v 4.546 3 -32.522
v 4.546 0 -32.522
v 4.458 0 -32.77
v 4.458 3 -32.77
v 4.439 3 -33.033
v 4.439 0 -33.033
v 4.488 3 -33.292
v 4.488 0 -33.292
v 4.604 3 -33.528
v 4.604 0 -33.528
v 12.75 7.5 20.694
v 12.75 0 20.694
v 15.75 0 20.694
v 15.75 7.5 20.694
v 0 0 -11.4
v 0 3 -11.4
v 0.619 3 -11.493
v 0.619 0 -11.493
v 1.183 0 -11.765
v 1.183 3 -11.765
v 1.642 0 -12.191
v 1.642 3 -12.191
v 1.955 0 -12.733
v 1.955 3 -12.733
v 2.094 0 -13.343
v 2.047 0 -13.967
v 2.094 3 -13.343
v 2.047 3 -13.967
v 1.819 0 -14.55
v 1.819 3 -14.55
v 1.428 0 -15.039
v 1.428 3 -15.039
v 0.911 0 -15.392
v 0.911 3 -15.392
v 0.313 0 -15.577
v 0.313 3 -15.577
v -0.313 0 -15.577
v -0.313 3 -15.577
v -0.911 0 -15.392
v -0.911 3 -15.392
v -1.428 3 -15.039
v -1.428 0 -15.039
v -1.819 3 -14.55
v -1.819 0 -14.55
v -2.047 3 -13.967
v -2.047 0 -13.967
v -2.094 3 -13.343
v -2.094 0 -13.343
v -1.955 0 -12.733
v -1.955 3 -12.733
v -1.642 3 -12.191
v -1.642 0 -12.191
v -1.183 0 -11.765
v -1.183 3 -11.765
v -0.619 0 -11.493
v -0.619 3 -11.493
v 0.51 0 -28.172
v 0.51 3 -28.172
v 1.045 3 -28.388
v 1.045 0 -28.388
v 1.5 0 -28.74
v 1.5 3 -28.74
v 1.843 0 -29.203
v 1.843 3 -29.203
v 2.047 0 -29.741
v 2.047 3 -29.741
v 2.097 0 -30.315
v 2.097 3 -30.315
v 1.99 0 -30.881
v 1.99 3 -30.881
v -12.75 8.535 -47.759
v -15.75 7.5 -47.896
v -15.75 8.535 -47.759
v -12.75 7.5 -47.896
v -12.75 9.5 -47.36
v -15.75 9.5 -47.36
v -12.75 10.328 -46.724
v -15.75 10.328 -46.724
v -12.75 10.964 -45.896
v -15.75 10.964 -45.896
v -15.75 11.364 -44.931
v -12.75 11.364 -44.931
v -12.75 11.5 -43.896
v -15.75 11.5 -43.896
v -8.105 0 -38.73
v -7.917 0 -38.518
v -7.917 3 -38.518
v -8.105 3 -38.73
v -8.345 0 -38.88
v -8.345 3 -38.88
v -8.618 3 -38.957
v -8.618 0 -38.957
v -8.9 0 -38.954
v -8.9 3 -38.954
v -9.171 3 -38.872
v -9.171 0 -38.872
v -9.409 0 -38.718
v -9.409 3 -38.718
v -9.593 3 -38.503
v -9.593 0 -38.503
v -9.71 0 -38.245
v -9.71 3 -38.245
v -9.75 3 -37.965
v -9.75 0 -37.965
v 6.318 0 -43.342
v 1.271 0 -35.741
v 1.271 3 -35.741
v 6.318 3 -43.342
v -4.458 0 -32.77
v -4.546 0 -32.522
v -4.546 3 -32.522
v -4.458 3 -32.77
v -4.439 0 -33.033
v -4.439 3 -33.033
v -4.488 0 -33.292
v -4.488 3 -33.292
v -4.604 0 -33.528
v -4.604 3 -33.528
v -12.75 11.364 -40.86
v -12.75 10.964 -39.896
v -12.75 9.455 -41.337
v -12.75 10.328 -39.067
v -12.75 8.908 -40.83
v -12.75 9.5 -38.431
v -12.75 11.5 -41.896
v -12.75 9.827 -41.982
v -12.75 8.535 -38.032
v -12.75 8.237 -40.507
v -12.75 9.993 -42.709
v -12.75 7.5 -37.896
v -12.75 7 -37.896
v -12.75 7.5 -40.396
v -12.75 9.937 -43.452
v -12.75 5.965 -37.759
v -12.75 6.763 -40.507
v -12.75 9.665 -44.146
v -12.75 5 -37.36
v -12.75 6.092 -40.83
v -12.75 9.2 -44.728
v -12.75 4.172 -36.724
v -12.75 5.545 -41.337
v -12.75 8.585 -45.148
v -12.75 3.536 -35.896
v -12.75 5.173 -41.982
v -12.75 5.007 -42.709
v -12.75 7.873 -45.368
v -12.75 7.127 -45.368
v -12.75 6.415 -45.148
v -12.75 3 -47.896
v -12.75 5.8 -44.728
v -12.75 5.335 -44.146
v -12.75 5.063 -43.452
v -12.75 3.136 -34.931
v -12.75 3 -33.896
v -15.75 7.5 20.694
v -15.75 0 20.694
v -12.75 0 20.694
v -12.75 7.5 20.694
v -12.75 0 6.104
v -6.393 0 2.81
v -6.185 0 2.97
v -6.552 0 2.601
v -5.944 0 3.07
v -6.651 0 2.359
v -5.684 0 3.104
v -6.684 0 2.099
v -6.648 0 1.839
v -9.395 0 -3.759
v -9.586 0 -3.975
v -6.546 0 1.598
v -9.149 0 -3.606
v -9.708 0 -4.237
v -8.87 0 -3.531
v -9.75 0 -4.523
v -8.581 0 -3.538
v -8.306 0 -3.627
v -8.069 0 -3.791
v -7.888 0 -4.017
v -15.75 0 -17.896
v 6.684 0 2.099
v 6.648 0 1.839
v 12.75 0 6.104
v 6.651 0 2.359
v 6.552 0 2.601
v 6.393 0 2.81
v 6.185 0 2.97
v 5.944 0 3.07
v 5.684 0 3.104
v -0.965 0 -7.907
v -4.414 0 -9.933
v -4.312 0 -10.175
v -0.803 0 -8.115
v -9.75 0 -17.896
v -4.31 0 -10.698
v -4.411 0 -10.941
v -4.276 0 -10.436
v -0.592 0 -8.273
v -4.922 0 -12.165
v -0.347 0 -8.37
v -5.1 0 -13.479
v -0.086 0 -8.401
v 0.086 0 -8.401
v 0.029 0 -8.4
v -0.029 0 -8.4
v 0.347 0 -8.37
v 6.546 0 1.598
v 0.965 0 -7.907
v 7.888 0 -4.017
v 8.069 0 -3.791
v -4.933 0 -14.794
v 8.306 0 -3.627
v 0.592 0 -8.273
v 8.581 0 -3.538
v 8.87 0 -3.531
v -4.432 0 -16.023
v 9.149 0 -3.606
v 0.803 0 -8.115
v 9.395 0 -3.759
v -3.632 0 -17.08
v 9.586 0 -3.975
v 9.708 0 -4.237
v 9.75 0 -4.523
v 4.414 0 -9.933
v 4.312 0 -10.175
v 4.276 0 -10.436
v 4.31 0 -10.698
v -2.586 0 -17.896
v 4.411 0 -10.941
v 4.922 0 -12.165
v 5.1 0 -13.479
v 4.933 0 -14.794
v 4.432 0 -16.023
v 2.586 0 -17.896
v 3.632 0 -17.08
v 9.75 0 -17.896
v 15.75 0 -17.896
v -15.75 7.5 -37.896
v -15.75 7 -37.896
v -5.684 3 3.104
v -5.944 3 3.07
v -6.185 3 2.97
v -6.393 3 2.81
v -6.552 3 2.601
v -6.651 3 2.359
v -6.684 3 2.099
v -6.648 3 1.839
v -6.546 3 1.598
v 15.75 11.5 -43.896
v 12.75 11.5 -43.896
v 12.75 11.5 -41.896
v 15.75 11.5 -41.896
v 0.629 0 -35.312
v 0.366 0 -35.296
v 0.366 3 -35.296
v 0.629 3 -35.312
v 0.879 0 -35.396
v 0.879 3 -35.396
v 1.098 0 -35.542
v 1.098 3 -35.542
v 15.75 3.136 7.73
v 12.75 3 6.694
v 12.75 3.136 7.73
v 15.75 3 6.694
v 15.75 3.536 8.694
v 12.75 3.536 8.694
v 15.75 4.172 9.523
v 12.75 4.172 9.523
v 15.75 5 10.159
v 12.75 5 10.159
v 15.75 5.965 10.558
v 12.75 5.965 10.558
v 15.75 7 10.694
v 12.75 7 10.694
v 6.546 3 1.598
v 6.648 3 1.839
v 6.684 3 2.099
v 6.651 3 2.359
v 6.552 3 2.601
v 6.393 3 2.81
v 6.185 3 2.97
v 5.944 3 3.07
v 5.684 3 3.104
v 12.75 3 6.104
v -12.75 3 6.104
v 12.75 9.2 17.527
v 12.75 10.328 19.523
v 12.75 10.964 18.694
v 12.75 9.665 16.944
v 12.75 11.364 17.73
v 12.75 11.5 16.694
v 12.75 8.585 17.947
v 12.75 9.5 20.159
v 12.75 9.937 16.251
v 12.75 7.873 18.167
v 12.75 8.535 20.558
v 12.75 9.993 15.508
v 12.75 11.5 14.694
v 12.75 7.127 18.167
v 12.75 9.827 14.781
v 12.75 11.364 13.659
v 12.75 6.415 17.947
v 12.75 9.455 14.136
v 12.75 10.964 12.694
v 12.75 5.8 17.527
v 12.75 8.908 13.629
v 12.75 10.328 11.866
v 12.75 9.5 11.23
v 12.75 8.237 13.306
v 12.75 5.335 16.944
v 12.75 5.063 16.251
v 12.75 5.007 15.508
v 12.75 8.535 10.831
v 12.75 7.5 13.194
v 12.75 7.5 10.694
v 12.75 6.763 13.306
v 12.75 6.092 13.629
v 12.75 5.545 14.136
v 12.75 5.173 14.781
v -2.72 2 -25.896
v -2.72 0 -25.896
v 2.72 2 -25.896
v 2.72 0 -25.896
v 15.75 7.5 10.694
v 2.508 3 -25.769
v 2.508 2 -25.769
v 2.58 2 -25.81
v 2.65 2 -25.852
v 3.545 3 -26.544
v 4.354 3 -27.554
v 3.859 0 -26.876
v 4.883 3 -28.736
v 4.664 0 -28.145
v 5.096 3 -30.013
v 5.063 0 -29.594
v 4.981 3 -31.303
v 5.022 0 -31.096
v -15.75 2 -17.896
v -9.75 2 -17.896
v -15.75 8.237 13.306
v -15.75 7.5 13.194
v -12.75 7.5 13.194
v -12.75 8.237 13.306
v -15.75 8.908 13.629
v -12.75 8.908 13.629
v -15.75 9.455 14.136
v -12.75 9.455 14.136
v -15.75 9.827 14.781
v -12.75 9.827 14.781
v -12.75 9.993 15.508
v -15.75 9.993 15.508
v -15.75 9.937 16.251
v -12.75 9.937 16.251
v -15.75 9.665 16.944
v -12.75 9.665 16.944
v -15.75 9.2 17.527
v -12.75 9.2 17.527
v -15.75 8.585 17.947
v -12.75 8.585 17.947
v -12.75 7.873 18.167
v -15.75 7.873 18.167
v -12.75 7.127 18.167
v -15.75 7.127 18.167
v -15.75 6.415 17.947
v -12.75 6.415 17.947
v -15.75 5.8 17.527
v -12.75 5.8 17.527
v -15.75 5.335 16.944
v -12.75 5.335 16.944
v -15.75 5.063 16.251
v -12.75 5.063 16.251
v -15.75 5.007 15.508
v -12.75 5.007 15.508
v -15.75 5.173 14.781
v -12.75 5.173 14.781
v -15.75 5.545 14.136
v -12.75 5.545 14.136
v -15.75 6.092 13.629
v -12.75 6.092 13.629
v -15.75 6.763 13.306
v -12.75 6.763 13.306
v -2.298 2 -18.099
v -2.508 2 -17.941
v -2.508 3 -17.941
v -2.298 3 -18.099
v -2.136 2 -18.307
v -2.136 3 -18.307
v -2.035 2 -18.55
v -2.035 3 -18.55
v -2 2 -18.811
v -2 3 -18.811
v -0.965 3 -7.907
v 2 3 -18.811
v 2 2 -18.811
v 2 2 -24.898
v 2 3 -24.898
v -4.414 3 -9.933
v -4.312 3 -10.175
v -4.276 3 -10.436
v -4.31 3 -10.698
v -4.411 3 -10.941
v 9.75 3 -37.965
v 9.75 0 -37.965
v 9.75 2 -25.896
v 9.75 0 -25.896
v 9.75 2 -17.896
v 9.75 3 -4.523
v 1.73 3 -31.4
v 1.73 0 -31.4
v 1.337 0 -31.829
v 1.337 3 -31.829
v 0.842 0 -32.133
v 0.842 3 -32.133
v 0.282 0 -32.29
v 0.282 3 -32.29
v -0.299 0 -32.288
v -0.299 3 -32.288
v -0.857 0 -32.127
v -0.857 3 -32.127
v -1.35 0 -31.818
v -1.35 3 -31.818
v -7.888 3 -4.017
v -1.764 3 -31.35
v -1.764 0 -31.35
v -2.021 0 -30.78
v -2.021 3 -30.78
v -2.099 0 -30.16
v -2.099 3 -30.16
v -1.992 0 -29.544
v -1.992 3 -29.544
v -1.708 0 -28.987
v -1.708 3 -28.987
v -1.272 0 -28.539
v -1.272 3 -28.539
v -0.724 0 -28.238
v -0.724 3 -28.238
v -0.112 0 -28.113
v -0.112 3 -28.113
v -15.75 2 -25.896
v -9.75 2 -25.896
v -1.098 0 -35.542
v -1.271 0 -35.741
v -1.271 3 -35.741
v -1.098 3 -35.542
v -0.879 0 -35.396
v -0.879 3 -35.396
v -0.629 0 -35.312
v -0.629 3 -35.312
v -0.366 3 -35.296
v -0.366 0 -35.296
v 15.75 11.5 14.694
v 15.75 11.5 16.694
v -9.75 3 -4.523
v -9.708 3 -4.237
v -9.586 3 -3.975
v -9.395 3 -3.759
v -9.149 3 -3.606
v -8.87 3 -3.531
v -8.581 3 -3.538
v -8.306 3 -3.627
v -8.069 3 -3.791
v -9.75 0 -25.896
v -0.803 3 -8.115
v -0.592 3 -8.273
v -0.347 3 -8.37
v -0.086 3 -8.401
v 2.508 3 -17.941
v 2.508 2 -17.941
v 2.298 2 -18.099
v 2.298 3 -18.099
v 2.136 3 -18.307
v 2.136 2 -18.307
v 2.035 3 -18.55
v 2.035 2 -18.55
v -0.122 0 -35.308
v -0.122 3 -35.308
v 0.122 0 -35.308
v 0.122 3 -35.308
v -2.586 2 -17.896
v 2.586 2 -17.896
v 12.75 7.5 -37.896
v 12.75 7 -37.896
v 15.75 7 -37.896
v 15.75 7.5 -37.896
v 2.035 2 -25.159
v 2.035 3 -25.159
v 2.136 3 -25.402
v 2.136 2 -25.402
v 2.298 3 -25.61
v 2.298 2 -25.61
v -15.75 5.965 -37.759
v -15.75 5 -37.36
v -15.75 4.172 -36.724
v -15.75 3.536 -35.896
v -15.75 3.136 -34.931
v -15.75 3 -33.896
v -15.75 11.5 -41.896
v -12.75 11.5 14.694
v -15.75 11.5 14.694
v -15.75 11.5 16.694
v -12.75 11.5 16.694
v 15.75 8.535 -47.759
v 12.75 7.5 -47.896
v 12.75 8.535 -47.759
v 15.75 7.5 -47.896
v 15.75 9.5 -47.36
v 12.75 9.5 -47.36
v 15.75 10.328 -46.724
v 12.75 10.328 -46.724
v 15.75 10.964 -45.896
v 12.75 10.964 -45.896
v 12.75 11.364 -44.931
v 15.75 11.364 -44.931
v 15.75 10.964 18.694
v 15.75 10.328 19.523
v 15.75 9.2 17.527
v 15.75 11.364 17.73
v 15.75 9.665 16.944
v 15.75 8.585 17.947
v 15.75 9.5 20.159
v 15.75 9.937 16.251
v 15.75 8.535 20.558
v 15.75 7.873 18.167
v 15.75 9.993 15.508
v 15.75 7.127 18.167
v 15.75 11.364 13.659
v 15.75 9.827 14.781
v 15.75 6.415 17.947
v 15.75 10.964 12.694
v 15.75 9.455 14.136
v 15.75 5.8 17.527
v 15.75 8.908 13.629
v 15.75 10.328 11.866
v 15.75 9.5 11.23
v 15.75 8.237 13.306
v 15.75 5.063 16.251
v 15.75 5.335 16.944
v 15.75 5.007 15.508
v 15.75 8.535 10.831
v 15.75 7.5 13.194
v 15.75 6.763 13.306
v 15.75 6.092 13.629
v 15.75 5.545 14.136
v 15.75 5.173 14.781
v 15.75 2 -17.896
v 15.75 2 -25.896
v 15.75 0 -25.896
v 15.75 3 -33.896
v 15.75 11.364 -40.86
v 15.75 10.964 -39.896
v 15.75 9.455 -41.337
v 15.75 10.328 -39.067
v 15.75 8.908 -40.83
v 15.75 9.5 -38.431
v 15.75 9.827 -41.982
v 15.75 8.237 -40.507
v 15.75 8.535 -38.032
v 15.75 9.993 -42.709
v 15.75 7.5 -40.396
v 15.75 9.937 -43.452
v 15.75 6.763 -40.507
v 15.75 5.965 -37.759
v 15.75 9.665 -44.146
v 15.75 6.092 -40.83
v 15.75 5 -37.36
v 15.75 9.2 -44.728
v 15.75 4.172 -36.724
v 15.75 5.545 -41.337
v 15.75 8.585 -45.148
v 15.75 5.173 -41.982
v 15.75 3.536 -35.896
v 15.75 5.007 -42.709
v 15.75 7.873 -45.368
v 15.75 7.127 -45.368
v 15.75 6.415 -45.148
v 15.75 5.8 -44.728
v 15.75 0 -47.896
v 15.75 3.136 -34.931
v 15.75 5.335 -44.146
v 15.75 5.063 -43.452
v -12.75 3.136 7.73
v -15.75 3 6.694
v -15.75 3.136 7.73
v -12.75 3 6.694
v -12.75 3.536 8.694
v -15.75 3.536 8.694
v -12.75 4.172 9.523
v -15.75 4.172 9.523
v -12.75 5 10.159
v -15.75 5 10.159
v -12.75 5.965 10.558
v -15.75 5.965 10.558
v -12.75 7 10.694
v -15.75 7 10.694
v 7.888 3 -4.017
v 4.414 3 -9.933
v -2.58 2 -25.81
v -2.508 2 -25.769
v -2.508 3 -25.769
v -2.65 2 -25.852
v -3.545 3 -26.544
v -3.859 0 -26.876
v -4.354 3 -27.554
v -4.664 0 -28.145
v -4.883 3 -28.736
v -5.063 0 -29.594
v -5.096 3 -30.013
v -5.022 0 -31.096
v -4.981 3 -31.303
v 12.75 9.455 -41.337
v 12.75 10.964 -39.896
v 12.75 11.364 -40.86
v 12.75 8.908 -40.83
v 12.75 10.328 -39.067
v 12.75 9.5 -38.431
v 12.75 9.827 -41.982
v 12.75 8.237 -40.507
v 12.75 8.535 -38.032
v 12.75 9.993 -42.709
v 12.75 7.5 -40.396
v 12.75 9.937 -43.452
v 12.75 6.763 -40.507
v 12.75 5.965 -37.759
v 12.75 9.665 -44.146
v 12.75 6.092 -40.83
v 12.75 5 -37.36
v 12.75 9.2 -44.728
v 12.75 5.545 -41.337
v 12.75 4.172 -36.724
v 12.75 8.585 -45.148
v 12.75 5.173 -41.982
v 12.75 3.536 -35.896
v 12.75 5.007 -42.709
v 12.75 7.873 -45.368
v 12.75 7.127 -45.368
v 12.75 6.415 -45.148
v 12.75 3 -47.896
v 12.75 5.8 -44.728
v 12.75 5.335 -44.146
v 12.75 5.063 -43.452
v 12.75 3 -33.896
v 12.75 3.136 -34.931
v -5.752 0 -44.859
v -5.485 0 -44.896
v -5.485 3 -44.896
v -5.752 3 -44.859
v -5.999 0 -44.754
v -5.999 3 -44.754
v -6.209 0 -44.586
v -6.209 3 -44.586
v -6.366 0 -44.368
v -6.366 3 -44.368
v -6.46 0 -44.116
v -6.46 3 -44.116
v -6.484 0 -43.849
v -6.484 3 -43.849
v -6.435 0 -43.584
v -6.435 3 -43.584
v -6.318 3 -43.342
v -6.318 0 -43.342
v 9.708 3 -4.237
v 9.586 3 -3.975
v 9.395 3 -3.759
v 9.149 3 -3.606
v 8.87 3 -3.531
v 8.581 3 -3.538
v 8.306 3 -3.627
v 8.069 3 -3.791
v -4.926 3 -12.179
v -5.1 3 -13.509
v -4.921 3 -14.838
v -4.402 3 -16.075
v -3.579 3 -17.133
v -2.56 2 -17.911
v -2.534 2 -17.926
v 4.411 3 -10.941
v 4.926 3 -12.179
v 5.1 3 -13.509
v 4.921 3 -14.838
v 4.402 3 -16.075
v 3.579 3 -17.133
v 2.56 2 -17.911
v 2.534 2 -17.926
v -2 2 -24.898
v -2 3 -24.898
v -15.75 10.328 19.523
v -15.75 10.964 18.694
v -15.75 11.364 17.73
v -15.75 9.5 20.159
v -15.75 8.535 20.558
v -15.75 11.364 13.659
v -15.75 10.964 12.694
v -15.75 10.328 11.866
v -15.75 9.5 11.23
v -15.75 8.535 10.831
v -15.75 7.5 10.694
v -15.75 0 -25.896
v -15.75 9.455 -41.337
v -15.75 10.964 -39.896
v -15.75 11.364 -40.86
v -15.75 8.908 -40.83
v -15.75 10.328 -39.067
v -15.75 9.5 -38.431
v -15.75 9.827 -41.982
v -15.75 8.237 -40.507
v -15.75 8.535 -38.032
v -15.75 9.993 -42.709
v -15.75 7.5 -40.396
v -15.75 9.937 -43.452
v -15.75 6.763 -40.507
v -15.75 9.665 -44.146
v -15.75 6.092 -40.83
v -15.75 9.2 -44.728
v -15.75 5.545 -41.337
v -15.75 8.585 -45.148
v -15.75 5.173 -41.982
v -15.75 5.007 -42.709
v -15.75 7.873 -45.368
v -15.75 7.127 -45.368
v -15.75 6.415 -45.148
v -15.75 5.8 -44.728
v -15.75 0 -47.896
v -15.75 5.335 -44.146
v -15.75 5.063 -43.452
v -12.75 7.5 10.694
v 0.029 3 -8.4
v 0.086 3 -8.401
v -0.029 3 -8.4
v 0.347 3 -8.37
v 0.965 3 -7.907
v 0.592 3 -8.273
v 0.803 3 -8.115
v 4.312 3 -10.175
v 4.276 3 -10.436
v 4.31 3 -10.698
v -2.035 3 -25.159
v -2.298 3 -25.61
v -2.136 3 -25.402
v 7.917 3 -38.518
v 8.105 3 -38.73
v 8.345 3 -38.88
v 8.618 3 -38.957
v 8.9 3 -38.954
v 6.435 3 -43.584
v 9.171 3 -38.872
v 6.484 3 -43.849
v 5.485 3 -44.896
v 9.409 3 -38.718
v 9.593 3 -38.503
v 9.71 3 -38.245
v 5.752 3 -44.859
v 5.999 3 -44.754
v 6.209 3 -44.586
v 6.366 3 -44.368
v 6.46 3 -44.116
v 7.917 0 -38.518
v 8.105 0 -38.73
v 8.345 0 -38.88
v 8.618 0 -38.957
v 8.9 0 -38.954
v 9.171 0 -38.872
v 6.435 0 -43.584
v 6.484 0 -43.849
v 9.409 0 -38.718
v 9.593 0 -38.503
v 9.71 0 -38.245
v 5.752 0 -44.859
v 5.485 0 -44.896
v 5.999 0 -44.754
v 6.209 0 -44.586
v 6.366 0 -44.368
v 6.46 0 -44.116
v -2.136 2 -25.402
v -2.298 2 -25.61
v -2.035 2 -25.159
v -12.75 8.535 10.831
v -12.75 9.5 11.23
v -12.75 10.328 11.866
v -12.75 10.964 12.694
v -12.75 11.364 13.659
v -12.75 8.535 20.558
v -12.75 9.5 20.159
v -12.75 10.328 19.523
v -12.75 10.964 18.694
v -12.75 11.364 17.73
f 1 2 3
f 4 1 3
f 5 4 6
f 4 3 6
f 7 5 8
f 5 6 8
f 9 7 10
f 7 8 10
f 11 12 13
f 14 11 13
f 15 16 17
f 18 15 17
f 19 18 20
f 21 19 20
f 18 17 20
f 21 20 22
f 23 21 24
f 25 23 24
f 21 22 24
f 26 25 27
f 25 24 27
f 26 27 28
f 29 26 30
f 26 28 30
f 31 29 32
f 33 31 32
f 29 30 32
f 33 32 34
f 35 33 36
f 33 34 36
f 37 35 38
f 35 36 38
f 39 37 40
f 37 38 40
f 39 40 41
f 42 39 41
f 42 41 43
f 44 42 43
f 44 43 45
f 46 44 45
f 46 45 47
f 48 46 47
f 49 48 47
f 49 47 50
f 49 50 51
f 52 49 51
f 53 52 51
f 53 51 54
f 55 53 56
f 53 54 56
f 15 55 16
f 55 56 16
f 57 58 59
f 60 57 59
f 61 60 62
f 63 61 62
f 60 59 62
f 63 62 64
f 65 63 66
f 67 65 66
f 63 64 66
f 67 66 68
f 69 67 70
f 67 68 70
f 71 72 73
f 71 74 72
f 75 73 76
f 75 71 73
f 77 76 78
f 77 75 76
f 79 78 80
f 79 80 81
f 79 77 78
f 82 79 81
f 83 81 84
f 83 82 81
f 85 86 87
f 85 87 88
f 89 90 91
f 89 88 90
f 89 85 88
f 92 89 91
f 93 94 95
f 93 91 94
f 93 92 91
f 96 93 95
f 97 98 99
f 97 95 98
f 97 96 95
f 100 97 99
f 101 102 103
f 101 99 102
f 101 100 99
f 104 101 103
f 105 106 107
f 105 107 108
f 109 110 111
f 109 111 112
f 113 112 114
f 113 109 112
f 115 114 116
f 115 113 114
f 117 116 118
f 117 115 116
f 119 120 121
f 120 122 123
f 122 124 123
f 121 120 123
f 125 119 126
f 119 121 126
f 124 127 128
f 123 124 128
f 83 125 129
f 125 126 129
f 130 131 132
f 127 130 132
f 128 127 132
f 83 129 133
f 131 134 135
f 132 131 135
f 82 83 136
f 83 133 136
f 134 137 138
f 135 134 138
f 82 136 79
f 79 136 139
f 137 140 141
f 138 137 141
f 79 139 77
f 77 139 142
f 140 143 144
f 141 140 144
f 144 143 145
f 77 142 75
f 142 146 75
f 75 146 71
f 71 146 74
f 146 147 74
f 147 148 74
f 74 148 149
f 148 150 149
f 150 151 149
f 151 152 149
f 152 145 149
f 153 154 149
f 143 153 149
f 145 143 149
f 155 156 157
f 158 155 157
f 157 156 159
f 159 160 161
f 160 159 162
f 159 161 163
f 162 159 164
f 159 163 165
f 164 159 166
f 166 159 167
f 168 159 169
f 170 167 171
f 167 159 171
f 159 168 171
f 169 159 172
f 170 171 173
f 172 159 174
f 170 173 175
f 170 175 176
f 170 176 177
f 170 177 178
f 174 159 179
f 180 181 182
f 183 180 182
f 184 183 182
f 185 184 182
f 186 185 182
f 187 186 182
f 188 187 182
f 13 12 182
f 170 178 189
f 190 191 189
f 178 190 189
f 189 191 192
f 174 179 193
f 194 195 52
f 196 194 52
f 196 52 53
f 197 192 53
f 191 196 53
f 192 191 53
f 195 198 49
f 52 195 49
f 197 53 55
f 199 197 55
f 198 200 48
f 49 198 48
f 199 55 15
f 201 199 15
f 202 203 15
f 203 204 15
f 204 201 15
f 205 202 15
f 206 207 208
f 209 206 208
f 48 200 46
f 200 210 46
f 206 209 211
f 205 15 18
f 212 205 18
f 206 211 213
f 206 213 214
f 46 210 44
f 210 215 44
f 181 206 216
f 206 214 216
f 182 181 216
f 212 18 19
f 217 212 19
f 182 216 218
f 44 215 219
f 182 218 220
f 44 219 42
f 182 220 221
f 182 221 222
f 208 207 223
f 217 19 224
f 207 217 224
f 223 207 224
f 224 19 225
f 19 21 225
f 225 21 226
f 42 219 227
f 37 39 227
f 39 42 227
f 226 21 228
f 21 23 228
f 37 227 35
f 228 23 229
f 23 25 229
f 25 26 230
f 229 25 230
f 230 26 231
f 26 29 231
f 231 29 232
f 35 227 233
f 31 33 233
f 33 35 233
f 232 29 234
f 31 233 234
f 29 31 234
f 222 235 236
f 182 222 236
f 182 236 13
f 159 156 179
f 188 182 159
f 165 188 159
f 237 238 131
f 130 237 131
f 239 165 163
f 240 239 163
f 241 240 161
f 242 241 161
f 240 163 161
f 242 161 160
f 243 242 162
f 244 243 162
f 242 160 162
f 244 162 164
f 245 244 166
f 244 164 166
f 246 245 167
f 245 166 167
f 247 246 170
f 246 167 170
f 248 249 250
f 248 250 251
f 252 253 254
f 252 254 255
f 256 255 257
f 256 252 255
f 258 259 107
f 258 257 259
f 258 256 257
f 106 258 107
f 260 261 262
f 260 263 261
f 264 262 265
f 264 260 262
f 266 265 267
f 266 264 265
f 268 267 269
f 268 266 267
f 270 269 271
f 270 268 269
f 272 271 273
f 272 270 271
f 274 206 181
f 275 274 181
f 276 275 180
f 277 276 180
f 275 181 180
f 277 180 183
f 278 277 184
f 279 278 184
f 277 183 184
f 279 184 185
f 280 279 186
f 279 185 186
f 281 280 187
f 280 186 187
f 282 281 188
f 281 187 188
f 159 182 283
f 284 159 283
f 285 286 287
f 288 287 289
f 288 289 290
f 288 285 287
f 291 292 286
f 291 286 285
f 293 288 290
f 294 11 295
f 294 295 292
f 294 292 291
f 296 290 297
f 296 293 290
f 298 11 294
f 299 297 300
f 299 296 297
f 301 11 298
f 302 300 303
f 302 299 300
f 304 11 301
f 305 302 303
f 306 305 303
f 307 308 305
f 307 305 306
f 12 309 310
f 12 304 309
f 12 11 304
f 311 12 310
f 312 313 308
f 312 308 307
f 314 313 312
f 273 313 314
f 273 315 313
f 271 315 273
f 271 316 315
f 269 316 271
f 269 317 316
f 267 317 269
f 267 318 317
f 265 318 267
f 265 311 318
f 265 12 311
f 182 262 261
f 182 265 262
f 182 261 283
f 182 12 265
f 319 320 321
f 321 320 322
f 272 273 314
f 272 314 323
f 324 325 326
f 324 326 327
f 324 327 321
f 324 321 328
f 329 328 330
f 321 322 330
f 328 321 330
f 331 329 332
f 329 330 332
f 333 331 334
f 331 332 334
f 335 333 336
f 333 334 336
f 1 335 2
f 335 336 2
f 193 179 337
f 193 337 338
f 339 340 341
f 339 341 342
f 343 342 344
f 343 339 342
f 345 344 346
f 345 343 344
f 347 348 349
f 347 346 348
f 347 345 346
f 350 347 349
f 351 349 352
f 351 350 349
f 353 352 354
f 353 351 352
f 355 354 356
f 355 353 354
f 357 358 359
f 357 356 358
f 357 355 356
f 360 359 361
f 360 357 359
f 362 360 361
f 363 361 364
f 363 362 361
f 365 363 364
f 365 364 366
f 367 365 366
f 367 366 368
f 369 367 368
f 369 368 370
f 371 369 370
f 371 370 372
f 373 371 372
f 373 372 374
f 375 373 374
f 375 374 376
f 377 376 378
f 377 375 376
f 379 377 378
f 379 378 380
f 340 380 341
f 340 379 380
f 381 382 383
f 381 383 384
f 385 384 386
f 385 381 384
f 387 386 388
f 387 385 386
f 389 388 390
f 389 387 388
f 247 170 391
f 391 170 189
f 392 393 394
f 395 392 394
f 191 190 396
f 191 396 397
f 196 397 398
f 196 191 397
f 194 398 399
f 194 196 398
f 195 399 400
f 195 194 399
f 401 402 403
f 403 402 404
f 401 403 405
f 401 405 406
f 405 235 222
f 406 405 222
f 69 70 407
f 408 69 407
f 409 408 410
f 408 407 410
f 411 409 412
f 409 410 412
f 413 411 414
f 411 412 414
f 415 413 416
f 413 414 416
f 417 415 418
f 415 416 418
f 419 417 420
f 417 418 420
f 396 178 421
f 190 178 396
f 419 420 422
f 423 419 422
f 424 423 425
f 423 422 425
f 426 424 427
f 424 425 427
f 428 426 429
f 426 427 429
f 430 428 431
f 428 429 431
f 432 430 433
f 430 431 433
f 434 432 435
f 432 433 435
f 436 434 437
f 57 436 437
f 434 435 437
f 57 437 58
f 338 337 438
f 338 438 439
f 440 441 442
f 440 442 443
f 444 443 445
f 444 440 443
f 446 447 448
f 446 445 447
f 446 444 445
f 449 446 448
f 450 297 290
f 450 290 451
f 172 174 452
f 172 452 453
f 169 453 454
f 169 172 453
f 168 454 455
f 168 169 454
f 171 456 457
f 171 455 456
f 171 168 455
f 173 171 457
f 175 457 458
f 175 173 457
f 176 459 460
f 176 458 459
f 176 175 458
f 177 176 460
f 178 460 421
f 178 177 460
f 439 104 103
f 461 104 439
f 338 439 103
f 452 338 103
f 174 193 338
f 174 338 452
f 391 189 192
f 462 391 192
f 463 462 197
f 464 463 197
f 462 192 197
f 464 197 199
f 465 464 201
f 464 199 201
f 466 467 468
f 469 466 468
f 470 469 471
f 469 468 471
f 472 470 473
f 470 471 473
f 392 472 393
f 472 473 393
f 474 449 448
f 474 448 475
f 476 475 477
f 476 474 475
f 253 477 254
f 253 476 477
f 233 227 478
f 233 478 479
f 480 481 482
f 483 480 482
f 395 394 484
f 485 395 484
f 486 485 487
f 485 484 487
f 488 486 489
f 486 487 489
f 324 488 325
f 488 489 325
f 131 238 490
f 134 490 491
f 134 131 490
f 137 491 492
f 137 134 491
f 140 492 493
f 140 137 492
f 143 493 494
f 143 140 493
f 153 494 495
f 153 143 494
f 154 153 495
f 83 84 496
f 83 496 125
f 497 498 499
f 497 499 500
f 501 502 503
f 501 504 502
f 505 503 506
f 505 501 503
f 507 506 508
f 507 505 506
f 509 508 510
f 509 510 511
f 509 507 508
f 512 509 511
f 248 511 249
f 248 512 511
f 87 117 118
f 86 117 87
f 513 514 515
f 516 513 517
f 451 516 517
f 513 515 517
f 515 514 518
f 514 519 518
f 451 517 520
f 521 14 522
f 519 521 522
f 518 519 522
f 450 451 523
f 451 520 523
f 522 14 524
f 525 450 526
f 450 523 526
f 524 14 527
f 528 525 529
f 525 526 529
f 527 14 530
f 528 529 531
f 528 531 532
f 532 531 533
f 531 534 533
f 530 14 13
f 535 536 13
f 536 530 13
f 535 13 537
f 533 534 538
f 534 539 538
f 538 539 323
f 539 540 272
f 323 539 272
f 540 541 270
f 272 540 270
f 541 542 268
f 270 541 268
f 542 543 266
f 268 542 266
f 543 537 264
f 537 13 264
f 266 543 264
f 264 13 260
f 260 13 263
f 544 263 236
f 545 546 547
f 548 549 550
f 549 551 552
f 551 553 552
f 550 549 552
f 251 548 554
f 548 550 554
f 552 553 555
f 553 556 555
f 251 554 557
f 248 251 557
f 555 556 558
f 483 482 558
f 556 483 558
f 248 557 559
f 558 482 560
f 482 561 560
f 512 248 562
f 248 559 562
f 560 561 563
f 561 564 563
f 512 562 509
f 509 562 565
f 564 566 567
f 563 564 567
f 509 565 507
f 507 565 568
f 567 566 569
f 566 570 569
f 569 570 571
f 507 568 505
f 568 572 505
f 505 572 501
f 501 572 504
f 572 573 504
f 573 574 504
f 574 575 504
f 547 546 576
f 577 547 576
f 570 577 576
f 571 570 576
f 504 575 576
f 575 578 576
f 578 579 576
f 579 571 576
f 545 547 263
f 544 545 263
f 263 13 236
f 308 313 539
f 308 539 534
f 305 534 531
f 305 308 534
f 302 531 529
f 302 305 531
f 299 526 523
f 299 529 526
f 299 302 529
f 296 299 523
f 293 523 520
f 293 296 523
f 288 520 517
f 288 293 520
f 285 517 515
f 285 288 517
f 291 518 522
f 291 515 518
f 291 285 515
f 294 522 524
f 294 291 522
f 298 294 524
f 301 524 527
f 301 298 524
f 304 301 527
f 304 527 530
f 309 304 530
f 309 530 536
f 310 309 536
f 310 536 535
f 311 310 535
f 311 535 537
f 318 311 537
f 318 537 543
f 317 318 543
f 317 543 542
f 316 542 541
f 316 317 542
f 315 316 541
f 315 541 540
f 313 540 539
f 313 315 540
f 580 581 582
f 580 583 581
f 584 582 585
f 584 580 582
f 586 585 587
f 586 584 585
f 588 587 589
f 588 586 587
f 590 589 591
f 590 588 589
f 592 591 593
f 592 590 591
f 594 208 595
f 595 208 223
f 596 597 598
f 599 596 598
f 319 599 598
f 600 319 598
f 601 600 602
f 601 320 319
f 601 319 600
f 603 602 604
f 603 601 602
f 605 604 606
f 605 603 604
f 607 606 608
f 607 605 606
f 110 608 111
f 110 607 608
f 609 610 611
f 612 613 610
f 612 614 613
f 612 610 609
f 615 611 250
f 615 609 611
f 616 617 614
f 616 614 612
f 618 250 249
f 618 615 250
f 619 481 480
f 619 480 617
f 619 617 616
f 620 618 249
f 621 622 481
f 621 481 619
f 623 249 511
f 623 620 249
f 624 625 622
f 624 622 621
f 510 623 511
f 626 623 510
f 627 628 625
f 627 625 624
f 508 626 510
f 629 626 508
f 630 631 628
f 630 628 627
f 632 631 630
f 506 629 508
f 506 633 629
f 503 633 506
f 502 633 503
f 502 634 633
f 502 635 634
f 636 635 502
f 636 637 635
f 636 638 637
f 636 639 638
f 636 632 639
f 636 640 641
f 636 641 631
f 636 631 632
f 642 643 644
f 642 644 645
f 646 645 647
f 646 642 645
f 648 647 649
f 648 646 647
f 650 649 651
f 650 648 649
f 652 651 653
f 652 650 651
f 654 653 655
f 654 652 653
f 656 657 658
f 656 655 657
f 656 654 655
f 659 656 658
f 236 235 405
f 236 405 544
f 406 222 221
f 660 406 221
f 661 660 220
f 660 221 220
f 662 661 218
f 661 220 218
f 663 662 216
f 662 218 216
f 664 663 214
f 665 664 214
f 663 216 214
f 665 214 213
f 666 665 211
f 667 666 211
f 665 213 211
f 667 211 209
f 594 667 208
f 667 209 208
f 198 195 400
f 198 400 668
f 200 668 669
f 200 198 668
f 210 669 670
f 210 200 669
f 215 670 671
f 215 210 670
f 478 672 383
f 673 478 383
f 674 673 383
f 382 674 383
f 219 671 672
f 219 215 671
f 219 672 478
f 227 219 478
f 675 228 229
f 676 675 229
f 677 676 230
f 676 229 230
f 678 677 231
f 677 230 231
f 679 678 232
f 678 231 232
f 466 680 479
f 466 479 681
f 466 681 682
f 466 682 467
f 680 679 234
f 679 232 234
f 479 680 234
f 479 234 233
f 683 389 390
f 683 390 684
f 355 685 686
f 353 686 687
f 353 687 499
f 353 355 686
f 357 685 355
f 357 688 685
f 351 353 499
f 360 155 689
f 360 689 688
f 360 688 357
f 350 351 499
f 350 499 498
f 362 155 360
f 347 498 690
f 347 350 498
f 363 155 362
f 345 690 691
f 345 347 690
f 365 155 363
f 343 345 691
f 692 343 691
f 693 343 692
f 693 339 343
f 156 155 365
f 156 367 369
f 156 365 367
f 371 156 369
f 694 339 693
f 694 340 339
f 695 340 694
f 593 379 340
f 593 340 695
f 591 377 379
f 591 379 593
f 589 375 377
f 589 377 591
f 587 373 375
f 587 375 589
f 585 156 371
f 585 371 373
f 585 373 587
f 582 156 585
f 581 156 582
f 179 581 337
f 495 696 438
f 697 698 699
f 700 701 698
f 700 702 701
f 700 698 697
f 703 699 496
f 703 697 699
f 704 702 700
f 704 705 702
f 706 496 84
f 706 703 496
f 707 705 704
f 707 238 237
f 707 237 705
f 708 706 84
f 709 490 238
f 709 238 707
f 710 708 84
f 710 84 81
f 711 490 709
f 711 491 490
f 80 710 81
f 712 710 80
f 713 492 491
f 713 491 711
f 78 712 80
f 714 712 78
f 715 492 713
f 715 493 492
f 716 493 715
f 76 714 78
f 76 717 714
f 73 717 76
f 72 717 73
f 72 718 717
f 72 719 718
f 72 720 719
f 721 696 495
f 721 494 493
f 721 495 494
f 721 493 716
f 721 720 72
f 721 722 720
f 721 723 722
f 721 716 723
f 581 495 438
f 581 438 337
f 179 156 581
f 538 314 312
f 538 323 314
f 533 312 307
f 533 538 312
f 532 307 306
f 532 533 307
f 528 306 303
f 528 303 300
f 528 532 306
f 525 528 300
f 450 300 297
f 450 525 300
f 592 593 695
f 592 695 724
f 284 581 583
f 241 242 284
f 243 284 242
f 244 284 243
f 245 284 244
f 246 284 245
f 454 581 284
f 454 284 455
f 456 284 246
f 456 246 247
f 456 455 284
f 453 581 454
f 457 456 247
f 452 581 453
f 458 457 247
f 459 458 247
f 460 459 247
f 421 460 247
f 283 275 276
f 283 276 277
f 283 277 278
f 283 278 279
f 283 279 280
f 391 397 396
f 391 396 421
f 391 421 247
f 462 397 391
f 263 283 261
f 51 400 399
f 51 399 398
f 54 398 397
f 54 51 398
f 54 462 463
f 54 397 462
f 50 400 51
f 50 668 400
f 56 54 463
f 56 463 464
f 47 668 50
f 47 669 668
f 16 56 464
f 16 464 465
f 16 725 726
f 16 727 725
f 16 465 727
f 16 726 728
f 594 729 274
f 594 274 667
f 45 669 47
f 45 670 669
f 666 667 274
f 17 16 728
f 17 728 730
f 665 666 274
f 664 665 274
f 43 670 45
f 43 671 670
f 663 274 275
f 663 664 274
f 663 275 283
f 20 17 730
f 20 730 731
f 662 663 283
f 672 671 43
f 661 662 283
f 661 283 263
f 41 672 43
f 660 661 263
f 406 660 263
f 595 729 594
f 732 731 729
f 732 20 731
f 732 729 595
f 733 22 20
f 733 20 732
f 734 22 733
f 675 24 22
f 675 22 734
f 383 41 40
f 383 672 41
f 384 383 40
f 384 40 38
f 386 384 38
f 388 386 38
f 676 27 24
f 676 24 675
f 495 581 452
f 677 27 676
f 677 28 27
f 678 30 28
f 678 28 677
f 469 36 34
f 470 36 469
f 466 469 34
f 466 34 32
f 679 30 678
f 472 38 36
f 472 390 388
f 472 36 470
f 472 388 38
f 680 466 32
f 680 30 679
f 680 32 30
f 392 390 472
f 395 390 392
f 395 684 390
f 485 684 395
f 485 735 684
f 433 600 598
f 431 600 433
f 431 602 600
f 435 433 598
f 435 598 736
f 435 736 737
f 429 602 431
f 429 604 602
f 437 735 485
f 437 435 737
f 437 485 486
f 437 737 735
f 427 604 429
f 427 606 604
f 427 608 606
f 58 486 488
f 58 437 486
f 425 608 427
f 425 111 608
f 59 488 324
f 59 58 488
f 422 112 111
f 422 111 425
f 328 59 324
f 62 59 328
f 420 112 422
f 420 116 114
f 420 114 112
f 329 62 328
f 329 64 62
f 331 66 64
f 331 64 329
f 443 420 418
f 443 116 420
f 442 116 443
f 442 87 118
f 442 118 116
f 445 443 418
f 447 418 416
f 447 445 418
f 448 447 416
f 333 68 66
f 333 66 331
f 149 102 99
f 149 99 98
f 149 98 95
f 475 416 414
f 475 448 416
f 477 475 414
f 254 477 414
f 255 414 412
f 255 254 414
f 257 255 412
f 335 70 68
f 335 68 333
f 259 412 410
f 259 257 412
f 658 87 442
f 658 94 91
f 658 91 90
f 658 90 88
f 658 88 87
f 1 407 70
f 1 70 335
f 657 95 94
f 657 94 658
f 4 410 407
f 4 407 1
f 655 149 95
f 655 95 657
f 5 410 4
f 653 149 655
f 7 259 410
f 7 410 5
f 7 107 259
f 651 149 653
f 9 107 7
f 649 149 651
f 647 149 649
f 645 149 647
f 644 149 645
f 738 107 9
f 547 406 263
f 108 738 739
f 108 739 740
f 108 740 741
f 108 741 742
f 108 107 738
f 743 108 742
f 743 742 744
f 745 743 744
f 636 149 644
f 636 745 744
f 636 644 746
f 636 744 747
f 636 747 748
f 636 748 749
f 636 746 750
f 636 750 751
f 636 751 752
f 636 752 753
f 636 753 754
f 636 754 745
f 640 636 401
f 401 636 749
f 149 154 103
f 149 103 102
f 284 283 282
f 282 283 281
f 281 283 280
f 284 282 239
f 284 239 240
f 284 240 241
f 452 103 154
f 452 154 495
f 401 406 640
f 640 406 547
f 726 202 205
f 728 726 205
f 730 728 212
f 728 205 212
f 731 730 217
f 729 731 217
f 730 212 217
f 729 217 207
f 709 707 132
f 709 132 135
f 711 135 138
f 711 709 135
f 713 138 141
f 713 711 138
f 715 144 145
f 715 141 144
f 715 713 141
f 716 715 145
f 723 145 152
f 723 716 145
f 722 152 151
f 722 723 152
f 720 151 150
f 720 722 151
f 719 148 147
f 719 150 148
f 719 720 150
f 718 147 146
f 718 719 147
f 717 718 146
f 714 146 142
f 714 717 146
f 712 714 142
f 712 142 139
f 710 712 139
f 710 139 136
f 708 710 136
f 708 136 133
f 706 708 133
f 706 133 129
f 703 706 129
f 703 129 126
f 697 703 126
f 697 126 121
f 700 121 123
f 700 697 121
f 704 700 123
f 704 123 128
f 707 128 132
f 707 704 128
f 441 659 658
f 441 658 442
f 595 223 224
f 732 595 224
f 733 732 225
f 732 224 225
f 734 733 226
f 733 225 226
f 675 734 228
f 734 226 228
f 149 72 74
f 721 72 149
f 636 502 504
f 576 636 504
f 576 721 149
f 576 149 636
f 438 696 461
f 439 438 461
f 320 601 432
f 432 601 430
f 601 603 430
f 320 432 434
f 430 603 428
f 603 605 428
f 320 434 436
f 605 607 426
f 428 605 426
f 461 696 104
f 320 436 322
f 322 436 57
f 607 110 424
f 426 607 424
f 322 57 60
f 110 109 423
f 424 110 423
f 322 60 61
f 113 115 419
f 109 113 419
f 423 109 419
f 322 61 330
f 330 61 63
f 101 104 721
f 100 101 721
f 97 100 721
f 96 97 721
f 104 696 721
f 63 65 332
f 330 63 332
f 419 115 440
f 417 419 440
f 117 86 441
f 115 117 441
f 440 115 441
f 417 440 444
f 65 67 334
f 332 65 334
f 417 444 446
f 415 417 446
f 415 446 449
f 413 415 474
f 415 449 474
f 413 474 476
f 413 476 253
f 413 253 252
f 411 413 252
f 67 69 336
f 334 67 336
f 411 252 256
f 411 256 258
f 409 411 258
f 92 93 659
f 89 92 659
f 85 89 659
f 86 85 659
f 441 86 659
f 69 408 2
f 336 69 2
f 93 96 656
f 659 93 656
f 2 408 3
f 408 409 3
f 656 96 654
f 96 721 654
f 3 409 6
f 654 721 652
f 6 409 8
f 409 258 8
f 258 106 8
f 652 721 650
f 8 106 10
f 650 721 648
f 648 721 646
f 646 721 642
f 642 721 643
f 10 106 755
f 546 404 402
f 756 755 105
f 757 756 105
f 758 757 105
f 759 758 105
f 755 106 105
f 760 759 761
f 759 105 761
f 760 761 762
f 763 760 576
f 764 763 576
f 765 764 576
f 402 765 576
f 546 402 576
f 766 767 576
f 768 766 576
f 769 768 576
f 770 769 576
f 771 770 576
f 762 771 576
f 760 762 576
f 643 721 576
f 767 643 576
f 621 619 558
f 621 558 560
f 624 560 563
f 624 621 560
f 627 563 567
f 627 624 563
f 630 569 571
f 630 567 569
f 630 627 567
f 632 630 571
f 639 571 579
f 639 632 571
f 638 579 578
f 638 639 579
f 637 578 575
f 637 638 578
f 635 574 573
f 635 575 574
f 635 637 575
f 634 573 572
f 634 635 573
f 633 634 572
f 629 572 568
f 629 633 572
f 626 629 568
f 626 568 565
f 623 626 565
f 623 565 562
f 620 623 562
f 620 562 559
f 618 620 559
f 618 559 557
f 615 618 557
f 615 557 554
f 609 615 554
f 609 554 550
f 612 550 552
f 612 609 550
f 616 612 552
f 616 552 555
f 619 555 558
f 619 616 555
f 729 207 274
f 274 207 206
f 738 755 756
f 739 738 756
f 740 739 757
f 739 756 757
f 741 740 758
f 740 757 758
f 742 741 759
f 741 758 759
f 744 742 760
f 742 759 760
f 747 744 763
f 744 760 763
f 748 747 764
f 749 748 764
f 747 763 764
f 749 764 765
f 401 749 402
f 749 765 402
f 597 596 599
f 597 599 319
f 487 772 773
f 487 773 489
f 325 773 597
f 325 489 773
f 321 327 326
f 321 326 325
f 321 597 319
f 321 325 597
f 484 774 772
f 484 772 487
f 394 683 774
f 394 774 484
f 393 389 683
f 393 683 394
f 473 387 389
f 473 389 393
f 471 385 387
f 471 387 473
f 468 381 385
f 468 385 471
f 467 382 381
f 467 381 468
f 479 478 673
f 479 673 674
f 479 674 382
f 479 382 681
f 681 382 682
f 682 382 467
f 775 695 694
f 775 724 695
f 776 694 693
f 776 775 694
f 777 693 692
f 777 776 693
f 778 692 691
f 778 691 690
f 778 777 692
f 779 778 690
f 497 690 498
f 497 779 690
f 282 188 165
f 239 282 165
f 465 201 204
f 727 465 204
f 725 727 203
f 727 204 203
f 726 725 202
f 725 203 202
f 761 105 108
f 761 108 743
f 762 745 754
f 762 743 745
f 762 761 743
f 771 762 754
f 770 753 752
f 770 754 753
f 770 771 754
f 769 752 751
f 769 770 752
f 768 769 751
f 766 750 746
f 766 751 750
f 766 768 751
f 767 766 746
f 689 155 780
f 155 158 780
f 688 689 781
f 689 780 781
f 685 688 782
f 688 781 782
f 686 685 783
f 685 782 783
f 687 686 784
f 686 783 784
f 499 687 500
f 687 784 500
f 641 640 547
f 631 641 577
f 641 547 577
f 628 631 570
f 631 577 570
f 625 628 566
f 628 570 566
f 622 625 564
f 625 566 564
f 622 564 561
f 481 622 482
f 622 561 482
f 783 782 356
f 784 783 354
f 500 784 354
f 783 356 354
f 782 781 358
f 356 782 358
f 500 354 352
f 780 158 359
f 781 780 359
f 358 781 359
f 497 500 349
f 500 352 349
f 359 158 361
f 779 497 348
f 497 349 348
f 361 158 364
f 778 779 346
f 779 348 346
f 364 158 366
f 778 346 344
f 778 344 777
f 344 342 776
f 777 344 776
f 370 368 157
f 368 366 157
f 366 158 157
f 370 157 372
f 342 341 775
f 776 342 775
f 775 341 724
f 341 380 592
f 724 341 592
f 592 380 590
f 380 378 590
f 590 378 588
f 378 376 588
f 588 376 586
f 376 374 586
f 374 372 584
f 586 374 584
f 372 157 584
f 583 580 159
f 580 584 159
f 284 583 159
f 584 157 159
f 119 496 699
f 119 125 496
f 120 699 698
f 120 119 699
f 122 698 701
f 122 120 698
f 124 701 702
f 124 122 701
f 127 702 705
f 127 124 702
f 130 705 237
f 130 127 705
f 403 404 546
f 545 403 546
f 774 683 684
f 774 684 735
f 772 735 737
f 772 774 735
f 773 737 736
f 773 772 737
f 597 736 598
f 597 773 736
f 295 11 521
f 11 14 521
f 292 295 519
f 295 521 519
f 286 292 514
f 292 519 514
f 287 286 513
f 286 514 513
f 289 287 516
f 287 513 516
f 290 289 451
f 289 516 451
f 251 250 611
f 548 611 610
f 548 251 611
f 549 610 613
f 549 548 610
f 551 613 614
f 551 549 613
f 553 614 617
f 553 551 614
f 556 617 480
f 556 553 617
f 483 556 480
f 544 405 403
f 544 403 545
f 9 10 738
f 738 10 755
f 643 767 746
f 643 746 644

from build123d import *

# Parameters (mm, degrees)
SKETCH1_W               = 54
SKETCH1_H               = 3
BOSS_EXTRUDE1_DEPTH     = 12.75
SKETCH2_W               = 3
SKETCH2_H               = 68.59
BOSS_EXTRUDE2_DEPTH     = 3
SKETCH4_R               = 2.1
CUT_EXTRUDE2_DEPTH      = 3
SKETCH5_W               = 3
SKETCH5_H               = 10
BOSS_EXTRUDE3_DEPTH     = 8.5
SKETCH6_W               = 31.5
SKETCH6_H               = 8
CUT_EXTRUDE3_DEPTH      = 2
FILLET1_R               = 4
CUT_EXTRUDE4_DEPTH      = 52.130188209
CUT_EXTRUDE4_DEPTH_BACK = 52.130188209
CUT_EXTRUDE5_DEPTH      = 59.46780008
CUT_EXTRUDE5_DEPTH_BACK = 59.46780008
SKETCH8_R               = 2.5


with BuildPart() as part:
    # Sketch1 → Boss-Extrude1 (new, symmetric)
    with BuildSketch(Plane(origin=(0, 0, 0), x_dir=(0, 0, -1), z_dir=(1, 0, 0))):
        with Locations((20.895549337, 1.5)):
            Rectangle(SKETCH1_W, SKETCH1_H)
    extrude(amount=BOSS_EXTRUDE1_DEPTH, both=True)

    # Sketch2 → Boss-Extrude2 (add)
    with BuildSketch(Plane(origin=(0, 0, 0), x_dir=(1, 0, 0), z_dir=(0, 1, 0))):
        with Locations((14.25, 13.600549337)):
            Rectangle(SKETCH2_W, SKETCH2_H)
        with Locations((-14.25, 13.600549337)):
            Rectangle(SKETCH2_W, SKETCH2_H)
    extrude(amount=BOSS_EXTRUDE2_DEPTH)

    # Sketch4 → Cut-Extrude2 (cut)
    with BuildSketch(Plane(origin=(0, 3, 0), x_dir=(1, 0, 0), z_dir=(0, 1, 0))):
        with Locations(Location((0, 13.5, 0), (0, 0, 270))):
            Circle(SKETCH4_R)
        with BuildLine():
            ThreePointArc((0.510375011, 28.172498171), (1.842935069, 29.202762349), (1.989848247, 30.880730496))
            ThreePointArc((1.989848247, 30.880730496), (0.567559264, 32.231384351), (-1.34985398, 31.818227914))
            ThreePointArc((-1.34985398, 31.818227914), (-1.870566111, 29.255080591), (0.510375011, 28.172498171))
        make_face()
    extrude(amount=-CUT_EXTRUDE2_DEPTH, mode=Mode.SUBTRACT)

    # Sketch5 → Boss-Extrude3 (add)
    with BuildSketch(Plane(origin=(0, 3, 0), x_dir=(1, 0, 0), z_dir=(0, 1, 0))):
        with Locations((-14.25, -15.694450663)):
            Rectangle(SKETCH5_W, SKETCH5_H)
        with Locations((14.25, -15.694450663)):
            Rectangle(SKETCH5_W, SKETCH5_H)
        with Locations((14.25, 42.895549337)):
            Rectangle(SKETCH5_W, SKETCH5_H)
        with Locations((-14.25, 42.895549337)):
            Rectangle(SKETCH5_W, SKETCH5_H)
    extrude(amount=BOSS_EXTRUDE3_DEPTH)

    # Sketch6 → Cut-Extrude3 (cut)
    with BuildSketch(Plane.XZ):
        with Locations((0, -21.895549337)):
            Rectangle(SKETCH6_W, SKETCH6_H)
    extrude(amount=-CUT_EXTRUDE3_DEPTH, mode=Mode.SUBTRACT)

    # Fillet1
    fillet1_edges = [part.edges().sort_by_distance(p)[0] for p in [
        (-14.25, 3, -37.895549337),
        (-14.25, 11.5, -47.895549337),
        (-14.25, 11.5, -37.895549337),
        (14.25, 3, -37.895549337),
        (14.25, 11.5, -37.895549337),
        (14.25, 11.5, -47.895549337),
        (14.25, 3, 10.694450663),
        (14.25, 11.5, 20.694450663),
        (14.25, 11.5, 10.694450663),
        (-14.25, 3, 10.694450663),
        (-14.25, 11.5, 10.694450663),
        (-14.25, 11.5, 20.694450663),
    ]]
    fillet(fillet1_edges, radius=FILLET1_R)

    # Sketch7 → Cut-Extrude4 (cut, two sides: drawn at the far end of the back side and taken through both)
    with BuildSketch(Plane(origin=(0, 3, 0), x_dir=(1, 0, 0), z_dir=(0, 1, 0)).offset(-CUT_EXTRUDE4_DEPTH_BACK)):
        with BuildLine():
            Line((0.964735196, 7.90721125), (6.54617705, -1.598099098))
            ThreePointArc((6.54617705, -1.598099098), (6.551706918, -2.60126473), (5.683849912, -3.104450663))
            Line((5.683849912, -3.104450663), (-5.683849912, -3.104450663))
            ThreePointArc((-5.683849912, -3.104450663), (-6.551706918, -2.60126473), (-6.54617705, -1.598099098))
            Line((-6.54617705, -1.598099098), (-0.964735196, 7.90721125))
            ThreePointArc((-0.964735196, 7.90721125), (-0.591919483, 8.272856568), (-0.085619852, 8.400718753))
            ThreePointArc((-0.085619852, 8.400718753), (0, 8.4), (0.085619852, 8.400718753))
            ThreePointArc((0.085619852, 8.400718753), (0.591919483, 8.272856568), (0.964735196, 7.90721125))
        make_face()
        with BuildLine():
            Line((-4.603921215, 33.528255639), (-7.916886234, 38.518435448))
            ThreePointArc((-7.916886234, 38.518435448), (-9.038865223, 38.922703555), (-9.75, 37.965333782))
            Line((-9.75, 37.965333782), (-9.75, 4.523307202))
            ThreePointArc((-9.75, 4.523307202), (-9.012366978, 3.558339032), (-7.887672863, 4.016955636))
            Line((-7.887672863, 4.016955636), (-4.414043746, 9.932617513))
            ThreePointArc((-4.414043746, 9.932617513), (-4.276374342, 10.436338854), (-4.41139205, 10.940777426))
            ThreePointArc((-4.41139205, 10.940777426), (-4.921337666, 14.838071589), (-2.508196721, 17.940602347))
            ThreePointArc((-2.508196721, 17.940602347), (-2.136344027, 18.30722699), (-2, 18.81130869))
            Line((-2, 18.81130869), (-2, 24.898225894))
            ThreePointArc((-2, 24.898225894), (-2.136344027, 25.402307594), (-2.508196721, 25.768932236))
            ThreePointArc((-2.508196721, 25.768932236), (-4.882585845, 28.736321948), (-4.545717772, 32.521773745))
            ThreePointArc((-4.545717772, 32.521773745), (-4.438702873, 33.032886126), (-4.603921215, 33.528255639))
        make_face()
        with BuildLine():
            Line((1.27146615, 35.740662301), (6.318268064, 43.342447671))
            ThreePointArc((6.318268064, 43.342447671), (6.366375514, 44.368253438), (5.485154298, 44.895549337))
            Line((5.485154298, 44.895549337), (-5.485154298, 44.895549337))
            ThreePointArc((-5.485154298, 44.895549337), (-6.366375514, 44.368253438), (-6.318268064, 43.342447671))
            Line((-6.318268064, 43.342447671), (-1.27146615, 35.740662301))
            ThreePointArc((-1.27146615, 35.740662301), (-0.879067636, 35.396117006), (-0.366491338, 35.296349314))
            ThreePointArc((-0.366491338, 35.296349314), (0, 35.309534584), (0.366491338, 35.296349314))
            ThreePointArc((0.366491338, 35.296349314), (0.879067636, 35.396117006), (1.27146615, 35.740662301))
        make_face()
        with BuildLine():
            Line((4.603921215, 33.528255639), (7.916886234, 38.518435448))
            ThreePointArc((7.916886234, 38.518435448), (9.038865223, 38.922703555), (9.75, 37.965333782))
            Line((9.75, 37.965333782), (9.75, 4.523307202))
            ThreePointArc((9.75, 4.523307202), (9.012366978, 3.558339032), (7.887672863, 4.016955636))
            Line((7.887672863, 4.016955636), (4.414043746, 9.932617513))
            ThreePointArc((4.414043746, 9.932617513), (4.276374342, 10.436338854), (4.41139205, 10.940777426))
            ThreePointArc((4.41139205, 10.940777426), (4.921337666, 14.838071589), (2.508196721, 17.940602347))
            ThreePointArc((2.508196721, 17.940602347), (2.136344027, 18.30722699), (2, 18.81130869))
            Line((2, 18.81130869), (2, 24.898225894))
            ThreePointArc((2, 24.898225894), (2.136344027, 25.402307594), (2.508196721, 25.768932236))
            ThreePointArc((2.508196721, 25.768932236), (4.882585845, 28.736321948), (4.545717772, 32.521773745))
            ThreePointArc((4.545717772, 32.521773745), (4.438702873, 33.032886126), (4.603921215, 33.528255639))
        make_face()
    extrude(amount=CUT_EXTRUDE4_DEPTH + CUT_EXTRUDE4_DEPTH_BACK, mode=Mode.SUBTRACT)

    # Sketch8 → Cut-Extrude5 (cut, two sides: drawn at the far end of the back side and taken through both)
    with BuildSketch(Plane(origin=(15.75, 0, 0), x_dir=(0, 0, -1), z_dir=(1, 0, 0)).offset(-CUT_EXTRUDE5_DEPTH_BACK)):
        with Locations((-15.694450663, 7.5)):
            Circle(SKETCH8_R)
        with Locations(Location((42.895549337, 7.5, 0), (0, 0, 180))):
            Circle(SKETCH8_R)
    extrude(amount=CUT_EXTRUDE5_DEPTH + CUT_EXTRUDE5_DEPTH_BACK, mode=Mode.SUBTRACT)


solid = part.part
